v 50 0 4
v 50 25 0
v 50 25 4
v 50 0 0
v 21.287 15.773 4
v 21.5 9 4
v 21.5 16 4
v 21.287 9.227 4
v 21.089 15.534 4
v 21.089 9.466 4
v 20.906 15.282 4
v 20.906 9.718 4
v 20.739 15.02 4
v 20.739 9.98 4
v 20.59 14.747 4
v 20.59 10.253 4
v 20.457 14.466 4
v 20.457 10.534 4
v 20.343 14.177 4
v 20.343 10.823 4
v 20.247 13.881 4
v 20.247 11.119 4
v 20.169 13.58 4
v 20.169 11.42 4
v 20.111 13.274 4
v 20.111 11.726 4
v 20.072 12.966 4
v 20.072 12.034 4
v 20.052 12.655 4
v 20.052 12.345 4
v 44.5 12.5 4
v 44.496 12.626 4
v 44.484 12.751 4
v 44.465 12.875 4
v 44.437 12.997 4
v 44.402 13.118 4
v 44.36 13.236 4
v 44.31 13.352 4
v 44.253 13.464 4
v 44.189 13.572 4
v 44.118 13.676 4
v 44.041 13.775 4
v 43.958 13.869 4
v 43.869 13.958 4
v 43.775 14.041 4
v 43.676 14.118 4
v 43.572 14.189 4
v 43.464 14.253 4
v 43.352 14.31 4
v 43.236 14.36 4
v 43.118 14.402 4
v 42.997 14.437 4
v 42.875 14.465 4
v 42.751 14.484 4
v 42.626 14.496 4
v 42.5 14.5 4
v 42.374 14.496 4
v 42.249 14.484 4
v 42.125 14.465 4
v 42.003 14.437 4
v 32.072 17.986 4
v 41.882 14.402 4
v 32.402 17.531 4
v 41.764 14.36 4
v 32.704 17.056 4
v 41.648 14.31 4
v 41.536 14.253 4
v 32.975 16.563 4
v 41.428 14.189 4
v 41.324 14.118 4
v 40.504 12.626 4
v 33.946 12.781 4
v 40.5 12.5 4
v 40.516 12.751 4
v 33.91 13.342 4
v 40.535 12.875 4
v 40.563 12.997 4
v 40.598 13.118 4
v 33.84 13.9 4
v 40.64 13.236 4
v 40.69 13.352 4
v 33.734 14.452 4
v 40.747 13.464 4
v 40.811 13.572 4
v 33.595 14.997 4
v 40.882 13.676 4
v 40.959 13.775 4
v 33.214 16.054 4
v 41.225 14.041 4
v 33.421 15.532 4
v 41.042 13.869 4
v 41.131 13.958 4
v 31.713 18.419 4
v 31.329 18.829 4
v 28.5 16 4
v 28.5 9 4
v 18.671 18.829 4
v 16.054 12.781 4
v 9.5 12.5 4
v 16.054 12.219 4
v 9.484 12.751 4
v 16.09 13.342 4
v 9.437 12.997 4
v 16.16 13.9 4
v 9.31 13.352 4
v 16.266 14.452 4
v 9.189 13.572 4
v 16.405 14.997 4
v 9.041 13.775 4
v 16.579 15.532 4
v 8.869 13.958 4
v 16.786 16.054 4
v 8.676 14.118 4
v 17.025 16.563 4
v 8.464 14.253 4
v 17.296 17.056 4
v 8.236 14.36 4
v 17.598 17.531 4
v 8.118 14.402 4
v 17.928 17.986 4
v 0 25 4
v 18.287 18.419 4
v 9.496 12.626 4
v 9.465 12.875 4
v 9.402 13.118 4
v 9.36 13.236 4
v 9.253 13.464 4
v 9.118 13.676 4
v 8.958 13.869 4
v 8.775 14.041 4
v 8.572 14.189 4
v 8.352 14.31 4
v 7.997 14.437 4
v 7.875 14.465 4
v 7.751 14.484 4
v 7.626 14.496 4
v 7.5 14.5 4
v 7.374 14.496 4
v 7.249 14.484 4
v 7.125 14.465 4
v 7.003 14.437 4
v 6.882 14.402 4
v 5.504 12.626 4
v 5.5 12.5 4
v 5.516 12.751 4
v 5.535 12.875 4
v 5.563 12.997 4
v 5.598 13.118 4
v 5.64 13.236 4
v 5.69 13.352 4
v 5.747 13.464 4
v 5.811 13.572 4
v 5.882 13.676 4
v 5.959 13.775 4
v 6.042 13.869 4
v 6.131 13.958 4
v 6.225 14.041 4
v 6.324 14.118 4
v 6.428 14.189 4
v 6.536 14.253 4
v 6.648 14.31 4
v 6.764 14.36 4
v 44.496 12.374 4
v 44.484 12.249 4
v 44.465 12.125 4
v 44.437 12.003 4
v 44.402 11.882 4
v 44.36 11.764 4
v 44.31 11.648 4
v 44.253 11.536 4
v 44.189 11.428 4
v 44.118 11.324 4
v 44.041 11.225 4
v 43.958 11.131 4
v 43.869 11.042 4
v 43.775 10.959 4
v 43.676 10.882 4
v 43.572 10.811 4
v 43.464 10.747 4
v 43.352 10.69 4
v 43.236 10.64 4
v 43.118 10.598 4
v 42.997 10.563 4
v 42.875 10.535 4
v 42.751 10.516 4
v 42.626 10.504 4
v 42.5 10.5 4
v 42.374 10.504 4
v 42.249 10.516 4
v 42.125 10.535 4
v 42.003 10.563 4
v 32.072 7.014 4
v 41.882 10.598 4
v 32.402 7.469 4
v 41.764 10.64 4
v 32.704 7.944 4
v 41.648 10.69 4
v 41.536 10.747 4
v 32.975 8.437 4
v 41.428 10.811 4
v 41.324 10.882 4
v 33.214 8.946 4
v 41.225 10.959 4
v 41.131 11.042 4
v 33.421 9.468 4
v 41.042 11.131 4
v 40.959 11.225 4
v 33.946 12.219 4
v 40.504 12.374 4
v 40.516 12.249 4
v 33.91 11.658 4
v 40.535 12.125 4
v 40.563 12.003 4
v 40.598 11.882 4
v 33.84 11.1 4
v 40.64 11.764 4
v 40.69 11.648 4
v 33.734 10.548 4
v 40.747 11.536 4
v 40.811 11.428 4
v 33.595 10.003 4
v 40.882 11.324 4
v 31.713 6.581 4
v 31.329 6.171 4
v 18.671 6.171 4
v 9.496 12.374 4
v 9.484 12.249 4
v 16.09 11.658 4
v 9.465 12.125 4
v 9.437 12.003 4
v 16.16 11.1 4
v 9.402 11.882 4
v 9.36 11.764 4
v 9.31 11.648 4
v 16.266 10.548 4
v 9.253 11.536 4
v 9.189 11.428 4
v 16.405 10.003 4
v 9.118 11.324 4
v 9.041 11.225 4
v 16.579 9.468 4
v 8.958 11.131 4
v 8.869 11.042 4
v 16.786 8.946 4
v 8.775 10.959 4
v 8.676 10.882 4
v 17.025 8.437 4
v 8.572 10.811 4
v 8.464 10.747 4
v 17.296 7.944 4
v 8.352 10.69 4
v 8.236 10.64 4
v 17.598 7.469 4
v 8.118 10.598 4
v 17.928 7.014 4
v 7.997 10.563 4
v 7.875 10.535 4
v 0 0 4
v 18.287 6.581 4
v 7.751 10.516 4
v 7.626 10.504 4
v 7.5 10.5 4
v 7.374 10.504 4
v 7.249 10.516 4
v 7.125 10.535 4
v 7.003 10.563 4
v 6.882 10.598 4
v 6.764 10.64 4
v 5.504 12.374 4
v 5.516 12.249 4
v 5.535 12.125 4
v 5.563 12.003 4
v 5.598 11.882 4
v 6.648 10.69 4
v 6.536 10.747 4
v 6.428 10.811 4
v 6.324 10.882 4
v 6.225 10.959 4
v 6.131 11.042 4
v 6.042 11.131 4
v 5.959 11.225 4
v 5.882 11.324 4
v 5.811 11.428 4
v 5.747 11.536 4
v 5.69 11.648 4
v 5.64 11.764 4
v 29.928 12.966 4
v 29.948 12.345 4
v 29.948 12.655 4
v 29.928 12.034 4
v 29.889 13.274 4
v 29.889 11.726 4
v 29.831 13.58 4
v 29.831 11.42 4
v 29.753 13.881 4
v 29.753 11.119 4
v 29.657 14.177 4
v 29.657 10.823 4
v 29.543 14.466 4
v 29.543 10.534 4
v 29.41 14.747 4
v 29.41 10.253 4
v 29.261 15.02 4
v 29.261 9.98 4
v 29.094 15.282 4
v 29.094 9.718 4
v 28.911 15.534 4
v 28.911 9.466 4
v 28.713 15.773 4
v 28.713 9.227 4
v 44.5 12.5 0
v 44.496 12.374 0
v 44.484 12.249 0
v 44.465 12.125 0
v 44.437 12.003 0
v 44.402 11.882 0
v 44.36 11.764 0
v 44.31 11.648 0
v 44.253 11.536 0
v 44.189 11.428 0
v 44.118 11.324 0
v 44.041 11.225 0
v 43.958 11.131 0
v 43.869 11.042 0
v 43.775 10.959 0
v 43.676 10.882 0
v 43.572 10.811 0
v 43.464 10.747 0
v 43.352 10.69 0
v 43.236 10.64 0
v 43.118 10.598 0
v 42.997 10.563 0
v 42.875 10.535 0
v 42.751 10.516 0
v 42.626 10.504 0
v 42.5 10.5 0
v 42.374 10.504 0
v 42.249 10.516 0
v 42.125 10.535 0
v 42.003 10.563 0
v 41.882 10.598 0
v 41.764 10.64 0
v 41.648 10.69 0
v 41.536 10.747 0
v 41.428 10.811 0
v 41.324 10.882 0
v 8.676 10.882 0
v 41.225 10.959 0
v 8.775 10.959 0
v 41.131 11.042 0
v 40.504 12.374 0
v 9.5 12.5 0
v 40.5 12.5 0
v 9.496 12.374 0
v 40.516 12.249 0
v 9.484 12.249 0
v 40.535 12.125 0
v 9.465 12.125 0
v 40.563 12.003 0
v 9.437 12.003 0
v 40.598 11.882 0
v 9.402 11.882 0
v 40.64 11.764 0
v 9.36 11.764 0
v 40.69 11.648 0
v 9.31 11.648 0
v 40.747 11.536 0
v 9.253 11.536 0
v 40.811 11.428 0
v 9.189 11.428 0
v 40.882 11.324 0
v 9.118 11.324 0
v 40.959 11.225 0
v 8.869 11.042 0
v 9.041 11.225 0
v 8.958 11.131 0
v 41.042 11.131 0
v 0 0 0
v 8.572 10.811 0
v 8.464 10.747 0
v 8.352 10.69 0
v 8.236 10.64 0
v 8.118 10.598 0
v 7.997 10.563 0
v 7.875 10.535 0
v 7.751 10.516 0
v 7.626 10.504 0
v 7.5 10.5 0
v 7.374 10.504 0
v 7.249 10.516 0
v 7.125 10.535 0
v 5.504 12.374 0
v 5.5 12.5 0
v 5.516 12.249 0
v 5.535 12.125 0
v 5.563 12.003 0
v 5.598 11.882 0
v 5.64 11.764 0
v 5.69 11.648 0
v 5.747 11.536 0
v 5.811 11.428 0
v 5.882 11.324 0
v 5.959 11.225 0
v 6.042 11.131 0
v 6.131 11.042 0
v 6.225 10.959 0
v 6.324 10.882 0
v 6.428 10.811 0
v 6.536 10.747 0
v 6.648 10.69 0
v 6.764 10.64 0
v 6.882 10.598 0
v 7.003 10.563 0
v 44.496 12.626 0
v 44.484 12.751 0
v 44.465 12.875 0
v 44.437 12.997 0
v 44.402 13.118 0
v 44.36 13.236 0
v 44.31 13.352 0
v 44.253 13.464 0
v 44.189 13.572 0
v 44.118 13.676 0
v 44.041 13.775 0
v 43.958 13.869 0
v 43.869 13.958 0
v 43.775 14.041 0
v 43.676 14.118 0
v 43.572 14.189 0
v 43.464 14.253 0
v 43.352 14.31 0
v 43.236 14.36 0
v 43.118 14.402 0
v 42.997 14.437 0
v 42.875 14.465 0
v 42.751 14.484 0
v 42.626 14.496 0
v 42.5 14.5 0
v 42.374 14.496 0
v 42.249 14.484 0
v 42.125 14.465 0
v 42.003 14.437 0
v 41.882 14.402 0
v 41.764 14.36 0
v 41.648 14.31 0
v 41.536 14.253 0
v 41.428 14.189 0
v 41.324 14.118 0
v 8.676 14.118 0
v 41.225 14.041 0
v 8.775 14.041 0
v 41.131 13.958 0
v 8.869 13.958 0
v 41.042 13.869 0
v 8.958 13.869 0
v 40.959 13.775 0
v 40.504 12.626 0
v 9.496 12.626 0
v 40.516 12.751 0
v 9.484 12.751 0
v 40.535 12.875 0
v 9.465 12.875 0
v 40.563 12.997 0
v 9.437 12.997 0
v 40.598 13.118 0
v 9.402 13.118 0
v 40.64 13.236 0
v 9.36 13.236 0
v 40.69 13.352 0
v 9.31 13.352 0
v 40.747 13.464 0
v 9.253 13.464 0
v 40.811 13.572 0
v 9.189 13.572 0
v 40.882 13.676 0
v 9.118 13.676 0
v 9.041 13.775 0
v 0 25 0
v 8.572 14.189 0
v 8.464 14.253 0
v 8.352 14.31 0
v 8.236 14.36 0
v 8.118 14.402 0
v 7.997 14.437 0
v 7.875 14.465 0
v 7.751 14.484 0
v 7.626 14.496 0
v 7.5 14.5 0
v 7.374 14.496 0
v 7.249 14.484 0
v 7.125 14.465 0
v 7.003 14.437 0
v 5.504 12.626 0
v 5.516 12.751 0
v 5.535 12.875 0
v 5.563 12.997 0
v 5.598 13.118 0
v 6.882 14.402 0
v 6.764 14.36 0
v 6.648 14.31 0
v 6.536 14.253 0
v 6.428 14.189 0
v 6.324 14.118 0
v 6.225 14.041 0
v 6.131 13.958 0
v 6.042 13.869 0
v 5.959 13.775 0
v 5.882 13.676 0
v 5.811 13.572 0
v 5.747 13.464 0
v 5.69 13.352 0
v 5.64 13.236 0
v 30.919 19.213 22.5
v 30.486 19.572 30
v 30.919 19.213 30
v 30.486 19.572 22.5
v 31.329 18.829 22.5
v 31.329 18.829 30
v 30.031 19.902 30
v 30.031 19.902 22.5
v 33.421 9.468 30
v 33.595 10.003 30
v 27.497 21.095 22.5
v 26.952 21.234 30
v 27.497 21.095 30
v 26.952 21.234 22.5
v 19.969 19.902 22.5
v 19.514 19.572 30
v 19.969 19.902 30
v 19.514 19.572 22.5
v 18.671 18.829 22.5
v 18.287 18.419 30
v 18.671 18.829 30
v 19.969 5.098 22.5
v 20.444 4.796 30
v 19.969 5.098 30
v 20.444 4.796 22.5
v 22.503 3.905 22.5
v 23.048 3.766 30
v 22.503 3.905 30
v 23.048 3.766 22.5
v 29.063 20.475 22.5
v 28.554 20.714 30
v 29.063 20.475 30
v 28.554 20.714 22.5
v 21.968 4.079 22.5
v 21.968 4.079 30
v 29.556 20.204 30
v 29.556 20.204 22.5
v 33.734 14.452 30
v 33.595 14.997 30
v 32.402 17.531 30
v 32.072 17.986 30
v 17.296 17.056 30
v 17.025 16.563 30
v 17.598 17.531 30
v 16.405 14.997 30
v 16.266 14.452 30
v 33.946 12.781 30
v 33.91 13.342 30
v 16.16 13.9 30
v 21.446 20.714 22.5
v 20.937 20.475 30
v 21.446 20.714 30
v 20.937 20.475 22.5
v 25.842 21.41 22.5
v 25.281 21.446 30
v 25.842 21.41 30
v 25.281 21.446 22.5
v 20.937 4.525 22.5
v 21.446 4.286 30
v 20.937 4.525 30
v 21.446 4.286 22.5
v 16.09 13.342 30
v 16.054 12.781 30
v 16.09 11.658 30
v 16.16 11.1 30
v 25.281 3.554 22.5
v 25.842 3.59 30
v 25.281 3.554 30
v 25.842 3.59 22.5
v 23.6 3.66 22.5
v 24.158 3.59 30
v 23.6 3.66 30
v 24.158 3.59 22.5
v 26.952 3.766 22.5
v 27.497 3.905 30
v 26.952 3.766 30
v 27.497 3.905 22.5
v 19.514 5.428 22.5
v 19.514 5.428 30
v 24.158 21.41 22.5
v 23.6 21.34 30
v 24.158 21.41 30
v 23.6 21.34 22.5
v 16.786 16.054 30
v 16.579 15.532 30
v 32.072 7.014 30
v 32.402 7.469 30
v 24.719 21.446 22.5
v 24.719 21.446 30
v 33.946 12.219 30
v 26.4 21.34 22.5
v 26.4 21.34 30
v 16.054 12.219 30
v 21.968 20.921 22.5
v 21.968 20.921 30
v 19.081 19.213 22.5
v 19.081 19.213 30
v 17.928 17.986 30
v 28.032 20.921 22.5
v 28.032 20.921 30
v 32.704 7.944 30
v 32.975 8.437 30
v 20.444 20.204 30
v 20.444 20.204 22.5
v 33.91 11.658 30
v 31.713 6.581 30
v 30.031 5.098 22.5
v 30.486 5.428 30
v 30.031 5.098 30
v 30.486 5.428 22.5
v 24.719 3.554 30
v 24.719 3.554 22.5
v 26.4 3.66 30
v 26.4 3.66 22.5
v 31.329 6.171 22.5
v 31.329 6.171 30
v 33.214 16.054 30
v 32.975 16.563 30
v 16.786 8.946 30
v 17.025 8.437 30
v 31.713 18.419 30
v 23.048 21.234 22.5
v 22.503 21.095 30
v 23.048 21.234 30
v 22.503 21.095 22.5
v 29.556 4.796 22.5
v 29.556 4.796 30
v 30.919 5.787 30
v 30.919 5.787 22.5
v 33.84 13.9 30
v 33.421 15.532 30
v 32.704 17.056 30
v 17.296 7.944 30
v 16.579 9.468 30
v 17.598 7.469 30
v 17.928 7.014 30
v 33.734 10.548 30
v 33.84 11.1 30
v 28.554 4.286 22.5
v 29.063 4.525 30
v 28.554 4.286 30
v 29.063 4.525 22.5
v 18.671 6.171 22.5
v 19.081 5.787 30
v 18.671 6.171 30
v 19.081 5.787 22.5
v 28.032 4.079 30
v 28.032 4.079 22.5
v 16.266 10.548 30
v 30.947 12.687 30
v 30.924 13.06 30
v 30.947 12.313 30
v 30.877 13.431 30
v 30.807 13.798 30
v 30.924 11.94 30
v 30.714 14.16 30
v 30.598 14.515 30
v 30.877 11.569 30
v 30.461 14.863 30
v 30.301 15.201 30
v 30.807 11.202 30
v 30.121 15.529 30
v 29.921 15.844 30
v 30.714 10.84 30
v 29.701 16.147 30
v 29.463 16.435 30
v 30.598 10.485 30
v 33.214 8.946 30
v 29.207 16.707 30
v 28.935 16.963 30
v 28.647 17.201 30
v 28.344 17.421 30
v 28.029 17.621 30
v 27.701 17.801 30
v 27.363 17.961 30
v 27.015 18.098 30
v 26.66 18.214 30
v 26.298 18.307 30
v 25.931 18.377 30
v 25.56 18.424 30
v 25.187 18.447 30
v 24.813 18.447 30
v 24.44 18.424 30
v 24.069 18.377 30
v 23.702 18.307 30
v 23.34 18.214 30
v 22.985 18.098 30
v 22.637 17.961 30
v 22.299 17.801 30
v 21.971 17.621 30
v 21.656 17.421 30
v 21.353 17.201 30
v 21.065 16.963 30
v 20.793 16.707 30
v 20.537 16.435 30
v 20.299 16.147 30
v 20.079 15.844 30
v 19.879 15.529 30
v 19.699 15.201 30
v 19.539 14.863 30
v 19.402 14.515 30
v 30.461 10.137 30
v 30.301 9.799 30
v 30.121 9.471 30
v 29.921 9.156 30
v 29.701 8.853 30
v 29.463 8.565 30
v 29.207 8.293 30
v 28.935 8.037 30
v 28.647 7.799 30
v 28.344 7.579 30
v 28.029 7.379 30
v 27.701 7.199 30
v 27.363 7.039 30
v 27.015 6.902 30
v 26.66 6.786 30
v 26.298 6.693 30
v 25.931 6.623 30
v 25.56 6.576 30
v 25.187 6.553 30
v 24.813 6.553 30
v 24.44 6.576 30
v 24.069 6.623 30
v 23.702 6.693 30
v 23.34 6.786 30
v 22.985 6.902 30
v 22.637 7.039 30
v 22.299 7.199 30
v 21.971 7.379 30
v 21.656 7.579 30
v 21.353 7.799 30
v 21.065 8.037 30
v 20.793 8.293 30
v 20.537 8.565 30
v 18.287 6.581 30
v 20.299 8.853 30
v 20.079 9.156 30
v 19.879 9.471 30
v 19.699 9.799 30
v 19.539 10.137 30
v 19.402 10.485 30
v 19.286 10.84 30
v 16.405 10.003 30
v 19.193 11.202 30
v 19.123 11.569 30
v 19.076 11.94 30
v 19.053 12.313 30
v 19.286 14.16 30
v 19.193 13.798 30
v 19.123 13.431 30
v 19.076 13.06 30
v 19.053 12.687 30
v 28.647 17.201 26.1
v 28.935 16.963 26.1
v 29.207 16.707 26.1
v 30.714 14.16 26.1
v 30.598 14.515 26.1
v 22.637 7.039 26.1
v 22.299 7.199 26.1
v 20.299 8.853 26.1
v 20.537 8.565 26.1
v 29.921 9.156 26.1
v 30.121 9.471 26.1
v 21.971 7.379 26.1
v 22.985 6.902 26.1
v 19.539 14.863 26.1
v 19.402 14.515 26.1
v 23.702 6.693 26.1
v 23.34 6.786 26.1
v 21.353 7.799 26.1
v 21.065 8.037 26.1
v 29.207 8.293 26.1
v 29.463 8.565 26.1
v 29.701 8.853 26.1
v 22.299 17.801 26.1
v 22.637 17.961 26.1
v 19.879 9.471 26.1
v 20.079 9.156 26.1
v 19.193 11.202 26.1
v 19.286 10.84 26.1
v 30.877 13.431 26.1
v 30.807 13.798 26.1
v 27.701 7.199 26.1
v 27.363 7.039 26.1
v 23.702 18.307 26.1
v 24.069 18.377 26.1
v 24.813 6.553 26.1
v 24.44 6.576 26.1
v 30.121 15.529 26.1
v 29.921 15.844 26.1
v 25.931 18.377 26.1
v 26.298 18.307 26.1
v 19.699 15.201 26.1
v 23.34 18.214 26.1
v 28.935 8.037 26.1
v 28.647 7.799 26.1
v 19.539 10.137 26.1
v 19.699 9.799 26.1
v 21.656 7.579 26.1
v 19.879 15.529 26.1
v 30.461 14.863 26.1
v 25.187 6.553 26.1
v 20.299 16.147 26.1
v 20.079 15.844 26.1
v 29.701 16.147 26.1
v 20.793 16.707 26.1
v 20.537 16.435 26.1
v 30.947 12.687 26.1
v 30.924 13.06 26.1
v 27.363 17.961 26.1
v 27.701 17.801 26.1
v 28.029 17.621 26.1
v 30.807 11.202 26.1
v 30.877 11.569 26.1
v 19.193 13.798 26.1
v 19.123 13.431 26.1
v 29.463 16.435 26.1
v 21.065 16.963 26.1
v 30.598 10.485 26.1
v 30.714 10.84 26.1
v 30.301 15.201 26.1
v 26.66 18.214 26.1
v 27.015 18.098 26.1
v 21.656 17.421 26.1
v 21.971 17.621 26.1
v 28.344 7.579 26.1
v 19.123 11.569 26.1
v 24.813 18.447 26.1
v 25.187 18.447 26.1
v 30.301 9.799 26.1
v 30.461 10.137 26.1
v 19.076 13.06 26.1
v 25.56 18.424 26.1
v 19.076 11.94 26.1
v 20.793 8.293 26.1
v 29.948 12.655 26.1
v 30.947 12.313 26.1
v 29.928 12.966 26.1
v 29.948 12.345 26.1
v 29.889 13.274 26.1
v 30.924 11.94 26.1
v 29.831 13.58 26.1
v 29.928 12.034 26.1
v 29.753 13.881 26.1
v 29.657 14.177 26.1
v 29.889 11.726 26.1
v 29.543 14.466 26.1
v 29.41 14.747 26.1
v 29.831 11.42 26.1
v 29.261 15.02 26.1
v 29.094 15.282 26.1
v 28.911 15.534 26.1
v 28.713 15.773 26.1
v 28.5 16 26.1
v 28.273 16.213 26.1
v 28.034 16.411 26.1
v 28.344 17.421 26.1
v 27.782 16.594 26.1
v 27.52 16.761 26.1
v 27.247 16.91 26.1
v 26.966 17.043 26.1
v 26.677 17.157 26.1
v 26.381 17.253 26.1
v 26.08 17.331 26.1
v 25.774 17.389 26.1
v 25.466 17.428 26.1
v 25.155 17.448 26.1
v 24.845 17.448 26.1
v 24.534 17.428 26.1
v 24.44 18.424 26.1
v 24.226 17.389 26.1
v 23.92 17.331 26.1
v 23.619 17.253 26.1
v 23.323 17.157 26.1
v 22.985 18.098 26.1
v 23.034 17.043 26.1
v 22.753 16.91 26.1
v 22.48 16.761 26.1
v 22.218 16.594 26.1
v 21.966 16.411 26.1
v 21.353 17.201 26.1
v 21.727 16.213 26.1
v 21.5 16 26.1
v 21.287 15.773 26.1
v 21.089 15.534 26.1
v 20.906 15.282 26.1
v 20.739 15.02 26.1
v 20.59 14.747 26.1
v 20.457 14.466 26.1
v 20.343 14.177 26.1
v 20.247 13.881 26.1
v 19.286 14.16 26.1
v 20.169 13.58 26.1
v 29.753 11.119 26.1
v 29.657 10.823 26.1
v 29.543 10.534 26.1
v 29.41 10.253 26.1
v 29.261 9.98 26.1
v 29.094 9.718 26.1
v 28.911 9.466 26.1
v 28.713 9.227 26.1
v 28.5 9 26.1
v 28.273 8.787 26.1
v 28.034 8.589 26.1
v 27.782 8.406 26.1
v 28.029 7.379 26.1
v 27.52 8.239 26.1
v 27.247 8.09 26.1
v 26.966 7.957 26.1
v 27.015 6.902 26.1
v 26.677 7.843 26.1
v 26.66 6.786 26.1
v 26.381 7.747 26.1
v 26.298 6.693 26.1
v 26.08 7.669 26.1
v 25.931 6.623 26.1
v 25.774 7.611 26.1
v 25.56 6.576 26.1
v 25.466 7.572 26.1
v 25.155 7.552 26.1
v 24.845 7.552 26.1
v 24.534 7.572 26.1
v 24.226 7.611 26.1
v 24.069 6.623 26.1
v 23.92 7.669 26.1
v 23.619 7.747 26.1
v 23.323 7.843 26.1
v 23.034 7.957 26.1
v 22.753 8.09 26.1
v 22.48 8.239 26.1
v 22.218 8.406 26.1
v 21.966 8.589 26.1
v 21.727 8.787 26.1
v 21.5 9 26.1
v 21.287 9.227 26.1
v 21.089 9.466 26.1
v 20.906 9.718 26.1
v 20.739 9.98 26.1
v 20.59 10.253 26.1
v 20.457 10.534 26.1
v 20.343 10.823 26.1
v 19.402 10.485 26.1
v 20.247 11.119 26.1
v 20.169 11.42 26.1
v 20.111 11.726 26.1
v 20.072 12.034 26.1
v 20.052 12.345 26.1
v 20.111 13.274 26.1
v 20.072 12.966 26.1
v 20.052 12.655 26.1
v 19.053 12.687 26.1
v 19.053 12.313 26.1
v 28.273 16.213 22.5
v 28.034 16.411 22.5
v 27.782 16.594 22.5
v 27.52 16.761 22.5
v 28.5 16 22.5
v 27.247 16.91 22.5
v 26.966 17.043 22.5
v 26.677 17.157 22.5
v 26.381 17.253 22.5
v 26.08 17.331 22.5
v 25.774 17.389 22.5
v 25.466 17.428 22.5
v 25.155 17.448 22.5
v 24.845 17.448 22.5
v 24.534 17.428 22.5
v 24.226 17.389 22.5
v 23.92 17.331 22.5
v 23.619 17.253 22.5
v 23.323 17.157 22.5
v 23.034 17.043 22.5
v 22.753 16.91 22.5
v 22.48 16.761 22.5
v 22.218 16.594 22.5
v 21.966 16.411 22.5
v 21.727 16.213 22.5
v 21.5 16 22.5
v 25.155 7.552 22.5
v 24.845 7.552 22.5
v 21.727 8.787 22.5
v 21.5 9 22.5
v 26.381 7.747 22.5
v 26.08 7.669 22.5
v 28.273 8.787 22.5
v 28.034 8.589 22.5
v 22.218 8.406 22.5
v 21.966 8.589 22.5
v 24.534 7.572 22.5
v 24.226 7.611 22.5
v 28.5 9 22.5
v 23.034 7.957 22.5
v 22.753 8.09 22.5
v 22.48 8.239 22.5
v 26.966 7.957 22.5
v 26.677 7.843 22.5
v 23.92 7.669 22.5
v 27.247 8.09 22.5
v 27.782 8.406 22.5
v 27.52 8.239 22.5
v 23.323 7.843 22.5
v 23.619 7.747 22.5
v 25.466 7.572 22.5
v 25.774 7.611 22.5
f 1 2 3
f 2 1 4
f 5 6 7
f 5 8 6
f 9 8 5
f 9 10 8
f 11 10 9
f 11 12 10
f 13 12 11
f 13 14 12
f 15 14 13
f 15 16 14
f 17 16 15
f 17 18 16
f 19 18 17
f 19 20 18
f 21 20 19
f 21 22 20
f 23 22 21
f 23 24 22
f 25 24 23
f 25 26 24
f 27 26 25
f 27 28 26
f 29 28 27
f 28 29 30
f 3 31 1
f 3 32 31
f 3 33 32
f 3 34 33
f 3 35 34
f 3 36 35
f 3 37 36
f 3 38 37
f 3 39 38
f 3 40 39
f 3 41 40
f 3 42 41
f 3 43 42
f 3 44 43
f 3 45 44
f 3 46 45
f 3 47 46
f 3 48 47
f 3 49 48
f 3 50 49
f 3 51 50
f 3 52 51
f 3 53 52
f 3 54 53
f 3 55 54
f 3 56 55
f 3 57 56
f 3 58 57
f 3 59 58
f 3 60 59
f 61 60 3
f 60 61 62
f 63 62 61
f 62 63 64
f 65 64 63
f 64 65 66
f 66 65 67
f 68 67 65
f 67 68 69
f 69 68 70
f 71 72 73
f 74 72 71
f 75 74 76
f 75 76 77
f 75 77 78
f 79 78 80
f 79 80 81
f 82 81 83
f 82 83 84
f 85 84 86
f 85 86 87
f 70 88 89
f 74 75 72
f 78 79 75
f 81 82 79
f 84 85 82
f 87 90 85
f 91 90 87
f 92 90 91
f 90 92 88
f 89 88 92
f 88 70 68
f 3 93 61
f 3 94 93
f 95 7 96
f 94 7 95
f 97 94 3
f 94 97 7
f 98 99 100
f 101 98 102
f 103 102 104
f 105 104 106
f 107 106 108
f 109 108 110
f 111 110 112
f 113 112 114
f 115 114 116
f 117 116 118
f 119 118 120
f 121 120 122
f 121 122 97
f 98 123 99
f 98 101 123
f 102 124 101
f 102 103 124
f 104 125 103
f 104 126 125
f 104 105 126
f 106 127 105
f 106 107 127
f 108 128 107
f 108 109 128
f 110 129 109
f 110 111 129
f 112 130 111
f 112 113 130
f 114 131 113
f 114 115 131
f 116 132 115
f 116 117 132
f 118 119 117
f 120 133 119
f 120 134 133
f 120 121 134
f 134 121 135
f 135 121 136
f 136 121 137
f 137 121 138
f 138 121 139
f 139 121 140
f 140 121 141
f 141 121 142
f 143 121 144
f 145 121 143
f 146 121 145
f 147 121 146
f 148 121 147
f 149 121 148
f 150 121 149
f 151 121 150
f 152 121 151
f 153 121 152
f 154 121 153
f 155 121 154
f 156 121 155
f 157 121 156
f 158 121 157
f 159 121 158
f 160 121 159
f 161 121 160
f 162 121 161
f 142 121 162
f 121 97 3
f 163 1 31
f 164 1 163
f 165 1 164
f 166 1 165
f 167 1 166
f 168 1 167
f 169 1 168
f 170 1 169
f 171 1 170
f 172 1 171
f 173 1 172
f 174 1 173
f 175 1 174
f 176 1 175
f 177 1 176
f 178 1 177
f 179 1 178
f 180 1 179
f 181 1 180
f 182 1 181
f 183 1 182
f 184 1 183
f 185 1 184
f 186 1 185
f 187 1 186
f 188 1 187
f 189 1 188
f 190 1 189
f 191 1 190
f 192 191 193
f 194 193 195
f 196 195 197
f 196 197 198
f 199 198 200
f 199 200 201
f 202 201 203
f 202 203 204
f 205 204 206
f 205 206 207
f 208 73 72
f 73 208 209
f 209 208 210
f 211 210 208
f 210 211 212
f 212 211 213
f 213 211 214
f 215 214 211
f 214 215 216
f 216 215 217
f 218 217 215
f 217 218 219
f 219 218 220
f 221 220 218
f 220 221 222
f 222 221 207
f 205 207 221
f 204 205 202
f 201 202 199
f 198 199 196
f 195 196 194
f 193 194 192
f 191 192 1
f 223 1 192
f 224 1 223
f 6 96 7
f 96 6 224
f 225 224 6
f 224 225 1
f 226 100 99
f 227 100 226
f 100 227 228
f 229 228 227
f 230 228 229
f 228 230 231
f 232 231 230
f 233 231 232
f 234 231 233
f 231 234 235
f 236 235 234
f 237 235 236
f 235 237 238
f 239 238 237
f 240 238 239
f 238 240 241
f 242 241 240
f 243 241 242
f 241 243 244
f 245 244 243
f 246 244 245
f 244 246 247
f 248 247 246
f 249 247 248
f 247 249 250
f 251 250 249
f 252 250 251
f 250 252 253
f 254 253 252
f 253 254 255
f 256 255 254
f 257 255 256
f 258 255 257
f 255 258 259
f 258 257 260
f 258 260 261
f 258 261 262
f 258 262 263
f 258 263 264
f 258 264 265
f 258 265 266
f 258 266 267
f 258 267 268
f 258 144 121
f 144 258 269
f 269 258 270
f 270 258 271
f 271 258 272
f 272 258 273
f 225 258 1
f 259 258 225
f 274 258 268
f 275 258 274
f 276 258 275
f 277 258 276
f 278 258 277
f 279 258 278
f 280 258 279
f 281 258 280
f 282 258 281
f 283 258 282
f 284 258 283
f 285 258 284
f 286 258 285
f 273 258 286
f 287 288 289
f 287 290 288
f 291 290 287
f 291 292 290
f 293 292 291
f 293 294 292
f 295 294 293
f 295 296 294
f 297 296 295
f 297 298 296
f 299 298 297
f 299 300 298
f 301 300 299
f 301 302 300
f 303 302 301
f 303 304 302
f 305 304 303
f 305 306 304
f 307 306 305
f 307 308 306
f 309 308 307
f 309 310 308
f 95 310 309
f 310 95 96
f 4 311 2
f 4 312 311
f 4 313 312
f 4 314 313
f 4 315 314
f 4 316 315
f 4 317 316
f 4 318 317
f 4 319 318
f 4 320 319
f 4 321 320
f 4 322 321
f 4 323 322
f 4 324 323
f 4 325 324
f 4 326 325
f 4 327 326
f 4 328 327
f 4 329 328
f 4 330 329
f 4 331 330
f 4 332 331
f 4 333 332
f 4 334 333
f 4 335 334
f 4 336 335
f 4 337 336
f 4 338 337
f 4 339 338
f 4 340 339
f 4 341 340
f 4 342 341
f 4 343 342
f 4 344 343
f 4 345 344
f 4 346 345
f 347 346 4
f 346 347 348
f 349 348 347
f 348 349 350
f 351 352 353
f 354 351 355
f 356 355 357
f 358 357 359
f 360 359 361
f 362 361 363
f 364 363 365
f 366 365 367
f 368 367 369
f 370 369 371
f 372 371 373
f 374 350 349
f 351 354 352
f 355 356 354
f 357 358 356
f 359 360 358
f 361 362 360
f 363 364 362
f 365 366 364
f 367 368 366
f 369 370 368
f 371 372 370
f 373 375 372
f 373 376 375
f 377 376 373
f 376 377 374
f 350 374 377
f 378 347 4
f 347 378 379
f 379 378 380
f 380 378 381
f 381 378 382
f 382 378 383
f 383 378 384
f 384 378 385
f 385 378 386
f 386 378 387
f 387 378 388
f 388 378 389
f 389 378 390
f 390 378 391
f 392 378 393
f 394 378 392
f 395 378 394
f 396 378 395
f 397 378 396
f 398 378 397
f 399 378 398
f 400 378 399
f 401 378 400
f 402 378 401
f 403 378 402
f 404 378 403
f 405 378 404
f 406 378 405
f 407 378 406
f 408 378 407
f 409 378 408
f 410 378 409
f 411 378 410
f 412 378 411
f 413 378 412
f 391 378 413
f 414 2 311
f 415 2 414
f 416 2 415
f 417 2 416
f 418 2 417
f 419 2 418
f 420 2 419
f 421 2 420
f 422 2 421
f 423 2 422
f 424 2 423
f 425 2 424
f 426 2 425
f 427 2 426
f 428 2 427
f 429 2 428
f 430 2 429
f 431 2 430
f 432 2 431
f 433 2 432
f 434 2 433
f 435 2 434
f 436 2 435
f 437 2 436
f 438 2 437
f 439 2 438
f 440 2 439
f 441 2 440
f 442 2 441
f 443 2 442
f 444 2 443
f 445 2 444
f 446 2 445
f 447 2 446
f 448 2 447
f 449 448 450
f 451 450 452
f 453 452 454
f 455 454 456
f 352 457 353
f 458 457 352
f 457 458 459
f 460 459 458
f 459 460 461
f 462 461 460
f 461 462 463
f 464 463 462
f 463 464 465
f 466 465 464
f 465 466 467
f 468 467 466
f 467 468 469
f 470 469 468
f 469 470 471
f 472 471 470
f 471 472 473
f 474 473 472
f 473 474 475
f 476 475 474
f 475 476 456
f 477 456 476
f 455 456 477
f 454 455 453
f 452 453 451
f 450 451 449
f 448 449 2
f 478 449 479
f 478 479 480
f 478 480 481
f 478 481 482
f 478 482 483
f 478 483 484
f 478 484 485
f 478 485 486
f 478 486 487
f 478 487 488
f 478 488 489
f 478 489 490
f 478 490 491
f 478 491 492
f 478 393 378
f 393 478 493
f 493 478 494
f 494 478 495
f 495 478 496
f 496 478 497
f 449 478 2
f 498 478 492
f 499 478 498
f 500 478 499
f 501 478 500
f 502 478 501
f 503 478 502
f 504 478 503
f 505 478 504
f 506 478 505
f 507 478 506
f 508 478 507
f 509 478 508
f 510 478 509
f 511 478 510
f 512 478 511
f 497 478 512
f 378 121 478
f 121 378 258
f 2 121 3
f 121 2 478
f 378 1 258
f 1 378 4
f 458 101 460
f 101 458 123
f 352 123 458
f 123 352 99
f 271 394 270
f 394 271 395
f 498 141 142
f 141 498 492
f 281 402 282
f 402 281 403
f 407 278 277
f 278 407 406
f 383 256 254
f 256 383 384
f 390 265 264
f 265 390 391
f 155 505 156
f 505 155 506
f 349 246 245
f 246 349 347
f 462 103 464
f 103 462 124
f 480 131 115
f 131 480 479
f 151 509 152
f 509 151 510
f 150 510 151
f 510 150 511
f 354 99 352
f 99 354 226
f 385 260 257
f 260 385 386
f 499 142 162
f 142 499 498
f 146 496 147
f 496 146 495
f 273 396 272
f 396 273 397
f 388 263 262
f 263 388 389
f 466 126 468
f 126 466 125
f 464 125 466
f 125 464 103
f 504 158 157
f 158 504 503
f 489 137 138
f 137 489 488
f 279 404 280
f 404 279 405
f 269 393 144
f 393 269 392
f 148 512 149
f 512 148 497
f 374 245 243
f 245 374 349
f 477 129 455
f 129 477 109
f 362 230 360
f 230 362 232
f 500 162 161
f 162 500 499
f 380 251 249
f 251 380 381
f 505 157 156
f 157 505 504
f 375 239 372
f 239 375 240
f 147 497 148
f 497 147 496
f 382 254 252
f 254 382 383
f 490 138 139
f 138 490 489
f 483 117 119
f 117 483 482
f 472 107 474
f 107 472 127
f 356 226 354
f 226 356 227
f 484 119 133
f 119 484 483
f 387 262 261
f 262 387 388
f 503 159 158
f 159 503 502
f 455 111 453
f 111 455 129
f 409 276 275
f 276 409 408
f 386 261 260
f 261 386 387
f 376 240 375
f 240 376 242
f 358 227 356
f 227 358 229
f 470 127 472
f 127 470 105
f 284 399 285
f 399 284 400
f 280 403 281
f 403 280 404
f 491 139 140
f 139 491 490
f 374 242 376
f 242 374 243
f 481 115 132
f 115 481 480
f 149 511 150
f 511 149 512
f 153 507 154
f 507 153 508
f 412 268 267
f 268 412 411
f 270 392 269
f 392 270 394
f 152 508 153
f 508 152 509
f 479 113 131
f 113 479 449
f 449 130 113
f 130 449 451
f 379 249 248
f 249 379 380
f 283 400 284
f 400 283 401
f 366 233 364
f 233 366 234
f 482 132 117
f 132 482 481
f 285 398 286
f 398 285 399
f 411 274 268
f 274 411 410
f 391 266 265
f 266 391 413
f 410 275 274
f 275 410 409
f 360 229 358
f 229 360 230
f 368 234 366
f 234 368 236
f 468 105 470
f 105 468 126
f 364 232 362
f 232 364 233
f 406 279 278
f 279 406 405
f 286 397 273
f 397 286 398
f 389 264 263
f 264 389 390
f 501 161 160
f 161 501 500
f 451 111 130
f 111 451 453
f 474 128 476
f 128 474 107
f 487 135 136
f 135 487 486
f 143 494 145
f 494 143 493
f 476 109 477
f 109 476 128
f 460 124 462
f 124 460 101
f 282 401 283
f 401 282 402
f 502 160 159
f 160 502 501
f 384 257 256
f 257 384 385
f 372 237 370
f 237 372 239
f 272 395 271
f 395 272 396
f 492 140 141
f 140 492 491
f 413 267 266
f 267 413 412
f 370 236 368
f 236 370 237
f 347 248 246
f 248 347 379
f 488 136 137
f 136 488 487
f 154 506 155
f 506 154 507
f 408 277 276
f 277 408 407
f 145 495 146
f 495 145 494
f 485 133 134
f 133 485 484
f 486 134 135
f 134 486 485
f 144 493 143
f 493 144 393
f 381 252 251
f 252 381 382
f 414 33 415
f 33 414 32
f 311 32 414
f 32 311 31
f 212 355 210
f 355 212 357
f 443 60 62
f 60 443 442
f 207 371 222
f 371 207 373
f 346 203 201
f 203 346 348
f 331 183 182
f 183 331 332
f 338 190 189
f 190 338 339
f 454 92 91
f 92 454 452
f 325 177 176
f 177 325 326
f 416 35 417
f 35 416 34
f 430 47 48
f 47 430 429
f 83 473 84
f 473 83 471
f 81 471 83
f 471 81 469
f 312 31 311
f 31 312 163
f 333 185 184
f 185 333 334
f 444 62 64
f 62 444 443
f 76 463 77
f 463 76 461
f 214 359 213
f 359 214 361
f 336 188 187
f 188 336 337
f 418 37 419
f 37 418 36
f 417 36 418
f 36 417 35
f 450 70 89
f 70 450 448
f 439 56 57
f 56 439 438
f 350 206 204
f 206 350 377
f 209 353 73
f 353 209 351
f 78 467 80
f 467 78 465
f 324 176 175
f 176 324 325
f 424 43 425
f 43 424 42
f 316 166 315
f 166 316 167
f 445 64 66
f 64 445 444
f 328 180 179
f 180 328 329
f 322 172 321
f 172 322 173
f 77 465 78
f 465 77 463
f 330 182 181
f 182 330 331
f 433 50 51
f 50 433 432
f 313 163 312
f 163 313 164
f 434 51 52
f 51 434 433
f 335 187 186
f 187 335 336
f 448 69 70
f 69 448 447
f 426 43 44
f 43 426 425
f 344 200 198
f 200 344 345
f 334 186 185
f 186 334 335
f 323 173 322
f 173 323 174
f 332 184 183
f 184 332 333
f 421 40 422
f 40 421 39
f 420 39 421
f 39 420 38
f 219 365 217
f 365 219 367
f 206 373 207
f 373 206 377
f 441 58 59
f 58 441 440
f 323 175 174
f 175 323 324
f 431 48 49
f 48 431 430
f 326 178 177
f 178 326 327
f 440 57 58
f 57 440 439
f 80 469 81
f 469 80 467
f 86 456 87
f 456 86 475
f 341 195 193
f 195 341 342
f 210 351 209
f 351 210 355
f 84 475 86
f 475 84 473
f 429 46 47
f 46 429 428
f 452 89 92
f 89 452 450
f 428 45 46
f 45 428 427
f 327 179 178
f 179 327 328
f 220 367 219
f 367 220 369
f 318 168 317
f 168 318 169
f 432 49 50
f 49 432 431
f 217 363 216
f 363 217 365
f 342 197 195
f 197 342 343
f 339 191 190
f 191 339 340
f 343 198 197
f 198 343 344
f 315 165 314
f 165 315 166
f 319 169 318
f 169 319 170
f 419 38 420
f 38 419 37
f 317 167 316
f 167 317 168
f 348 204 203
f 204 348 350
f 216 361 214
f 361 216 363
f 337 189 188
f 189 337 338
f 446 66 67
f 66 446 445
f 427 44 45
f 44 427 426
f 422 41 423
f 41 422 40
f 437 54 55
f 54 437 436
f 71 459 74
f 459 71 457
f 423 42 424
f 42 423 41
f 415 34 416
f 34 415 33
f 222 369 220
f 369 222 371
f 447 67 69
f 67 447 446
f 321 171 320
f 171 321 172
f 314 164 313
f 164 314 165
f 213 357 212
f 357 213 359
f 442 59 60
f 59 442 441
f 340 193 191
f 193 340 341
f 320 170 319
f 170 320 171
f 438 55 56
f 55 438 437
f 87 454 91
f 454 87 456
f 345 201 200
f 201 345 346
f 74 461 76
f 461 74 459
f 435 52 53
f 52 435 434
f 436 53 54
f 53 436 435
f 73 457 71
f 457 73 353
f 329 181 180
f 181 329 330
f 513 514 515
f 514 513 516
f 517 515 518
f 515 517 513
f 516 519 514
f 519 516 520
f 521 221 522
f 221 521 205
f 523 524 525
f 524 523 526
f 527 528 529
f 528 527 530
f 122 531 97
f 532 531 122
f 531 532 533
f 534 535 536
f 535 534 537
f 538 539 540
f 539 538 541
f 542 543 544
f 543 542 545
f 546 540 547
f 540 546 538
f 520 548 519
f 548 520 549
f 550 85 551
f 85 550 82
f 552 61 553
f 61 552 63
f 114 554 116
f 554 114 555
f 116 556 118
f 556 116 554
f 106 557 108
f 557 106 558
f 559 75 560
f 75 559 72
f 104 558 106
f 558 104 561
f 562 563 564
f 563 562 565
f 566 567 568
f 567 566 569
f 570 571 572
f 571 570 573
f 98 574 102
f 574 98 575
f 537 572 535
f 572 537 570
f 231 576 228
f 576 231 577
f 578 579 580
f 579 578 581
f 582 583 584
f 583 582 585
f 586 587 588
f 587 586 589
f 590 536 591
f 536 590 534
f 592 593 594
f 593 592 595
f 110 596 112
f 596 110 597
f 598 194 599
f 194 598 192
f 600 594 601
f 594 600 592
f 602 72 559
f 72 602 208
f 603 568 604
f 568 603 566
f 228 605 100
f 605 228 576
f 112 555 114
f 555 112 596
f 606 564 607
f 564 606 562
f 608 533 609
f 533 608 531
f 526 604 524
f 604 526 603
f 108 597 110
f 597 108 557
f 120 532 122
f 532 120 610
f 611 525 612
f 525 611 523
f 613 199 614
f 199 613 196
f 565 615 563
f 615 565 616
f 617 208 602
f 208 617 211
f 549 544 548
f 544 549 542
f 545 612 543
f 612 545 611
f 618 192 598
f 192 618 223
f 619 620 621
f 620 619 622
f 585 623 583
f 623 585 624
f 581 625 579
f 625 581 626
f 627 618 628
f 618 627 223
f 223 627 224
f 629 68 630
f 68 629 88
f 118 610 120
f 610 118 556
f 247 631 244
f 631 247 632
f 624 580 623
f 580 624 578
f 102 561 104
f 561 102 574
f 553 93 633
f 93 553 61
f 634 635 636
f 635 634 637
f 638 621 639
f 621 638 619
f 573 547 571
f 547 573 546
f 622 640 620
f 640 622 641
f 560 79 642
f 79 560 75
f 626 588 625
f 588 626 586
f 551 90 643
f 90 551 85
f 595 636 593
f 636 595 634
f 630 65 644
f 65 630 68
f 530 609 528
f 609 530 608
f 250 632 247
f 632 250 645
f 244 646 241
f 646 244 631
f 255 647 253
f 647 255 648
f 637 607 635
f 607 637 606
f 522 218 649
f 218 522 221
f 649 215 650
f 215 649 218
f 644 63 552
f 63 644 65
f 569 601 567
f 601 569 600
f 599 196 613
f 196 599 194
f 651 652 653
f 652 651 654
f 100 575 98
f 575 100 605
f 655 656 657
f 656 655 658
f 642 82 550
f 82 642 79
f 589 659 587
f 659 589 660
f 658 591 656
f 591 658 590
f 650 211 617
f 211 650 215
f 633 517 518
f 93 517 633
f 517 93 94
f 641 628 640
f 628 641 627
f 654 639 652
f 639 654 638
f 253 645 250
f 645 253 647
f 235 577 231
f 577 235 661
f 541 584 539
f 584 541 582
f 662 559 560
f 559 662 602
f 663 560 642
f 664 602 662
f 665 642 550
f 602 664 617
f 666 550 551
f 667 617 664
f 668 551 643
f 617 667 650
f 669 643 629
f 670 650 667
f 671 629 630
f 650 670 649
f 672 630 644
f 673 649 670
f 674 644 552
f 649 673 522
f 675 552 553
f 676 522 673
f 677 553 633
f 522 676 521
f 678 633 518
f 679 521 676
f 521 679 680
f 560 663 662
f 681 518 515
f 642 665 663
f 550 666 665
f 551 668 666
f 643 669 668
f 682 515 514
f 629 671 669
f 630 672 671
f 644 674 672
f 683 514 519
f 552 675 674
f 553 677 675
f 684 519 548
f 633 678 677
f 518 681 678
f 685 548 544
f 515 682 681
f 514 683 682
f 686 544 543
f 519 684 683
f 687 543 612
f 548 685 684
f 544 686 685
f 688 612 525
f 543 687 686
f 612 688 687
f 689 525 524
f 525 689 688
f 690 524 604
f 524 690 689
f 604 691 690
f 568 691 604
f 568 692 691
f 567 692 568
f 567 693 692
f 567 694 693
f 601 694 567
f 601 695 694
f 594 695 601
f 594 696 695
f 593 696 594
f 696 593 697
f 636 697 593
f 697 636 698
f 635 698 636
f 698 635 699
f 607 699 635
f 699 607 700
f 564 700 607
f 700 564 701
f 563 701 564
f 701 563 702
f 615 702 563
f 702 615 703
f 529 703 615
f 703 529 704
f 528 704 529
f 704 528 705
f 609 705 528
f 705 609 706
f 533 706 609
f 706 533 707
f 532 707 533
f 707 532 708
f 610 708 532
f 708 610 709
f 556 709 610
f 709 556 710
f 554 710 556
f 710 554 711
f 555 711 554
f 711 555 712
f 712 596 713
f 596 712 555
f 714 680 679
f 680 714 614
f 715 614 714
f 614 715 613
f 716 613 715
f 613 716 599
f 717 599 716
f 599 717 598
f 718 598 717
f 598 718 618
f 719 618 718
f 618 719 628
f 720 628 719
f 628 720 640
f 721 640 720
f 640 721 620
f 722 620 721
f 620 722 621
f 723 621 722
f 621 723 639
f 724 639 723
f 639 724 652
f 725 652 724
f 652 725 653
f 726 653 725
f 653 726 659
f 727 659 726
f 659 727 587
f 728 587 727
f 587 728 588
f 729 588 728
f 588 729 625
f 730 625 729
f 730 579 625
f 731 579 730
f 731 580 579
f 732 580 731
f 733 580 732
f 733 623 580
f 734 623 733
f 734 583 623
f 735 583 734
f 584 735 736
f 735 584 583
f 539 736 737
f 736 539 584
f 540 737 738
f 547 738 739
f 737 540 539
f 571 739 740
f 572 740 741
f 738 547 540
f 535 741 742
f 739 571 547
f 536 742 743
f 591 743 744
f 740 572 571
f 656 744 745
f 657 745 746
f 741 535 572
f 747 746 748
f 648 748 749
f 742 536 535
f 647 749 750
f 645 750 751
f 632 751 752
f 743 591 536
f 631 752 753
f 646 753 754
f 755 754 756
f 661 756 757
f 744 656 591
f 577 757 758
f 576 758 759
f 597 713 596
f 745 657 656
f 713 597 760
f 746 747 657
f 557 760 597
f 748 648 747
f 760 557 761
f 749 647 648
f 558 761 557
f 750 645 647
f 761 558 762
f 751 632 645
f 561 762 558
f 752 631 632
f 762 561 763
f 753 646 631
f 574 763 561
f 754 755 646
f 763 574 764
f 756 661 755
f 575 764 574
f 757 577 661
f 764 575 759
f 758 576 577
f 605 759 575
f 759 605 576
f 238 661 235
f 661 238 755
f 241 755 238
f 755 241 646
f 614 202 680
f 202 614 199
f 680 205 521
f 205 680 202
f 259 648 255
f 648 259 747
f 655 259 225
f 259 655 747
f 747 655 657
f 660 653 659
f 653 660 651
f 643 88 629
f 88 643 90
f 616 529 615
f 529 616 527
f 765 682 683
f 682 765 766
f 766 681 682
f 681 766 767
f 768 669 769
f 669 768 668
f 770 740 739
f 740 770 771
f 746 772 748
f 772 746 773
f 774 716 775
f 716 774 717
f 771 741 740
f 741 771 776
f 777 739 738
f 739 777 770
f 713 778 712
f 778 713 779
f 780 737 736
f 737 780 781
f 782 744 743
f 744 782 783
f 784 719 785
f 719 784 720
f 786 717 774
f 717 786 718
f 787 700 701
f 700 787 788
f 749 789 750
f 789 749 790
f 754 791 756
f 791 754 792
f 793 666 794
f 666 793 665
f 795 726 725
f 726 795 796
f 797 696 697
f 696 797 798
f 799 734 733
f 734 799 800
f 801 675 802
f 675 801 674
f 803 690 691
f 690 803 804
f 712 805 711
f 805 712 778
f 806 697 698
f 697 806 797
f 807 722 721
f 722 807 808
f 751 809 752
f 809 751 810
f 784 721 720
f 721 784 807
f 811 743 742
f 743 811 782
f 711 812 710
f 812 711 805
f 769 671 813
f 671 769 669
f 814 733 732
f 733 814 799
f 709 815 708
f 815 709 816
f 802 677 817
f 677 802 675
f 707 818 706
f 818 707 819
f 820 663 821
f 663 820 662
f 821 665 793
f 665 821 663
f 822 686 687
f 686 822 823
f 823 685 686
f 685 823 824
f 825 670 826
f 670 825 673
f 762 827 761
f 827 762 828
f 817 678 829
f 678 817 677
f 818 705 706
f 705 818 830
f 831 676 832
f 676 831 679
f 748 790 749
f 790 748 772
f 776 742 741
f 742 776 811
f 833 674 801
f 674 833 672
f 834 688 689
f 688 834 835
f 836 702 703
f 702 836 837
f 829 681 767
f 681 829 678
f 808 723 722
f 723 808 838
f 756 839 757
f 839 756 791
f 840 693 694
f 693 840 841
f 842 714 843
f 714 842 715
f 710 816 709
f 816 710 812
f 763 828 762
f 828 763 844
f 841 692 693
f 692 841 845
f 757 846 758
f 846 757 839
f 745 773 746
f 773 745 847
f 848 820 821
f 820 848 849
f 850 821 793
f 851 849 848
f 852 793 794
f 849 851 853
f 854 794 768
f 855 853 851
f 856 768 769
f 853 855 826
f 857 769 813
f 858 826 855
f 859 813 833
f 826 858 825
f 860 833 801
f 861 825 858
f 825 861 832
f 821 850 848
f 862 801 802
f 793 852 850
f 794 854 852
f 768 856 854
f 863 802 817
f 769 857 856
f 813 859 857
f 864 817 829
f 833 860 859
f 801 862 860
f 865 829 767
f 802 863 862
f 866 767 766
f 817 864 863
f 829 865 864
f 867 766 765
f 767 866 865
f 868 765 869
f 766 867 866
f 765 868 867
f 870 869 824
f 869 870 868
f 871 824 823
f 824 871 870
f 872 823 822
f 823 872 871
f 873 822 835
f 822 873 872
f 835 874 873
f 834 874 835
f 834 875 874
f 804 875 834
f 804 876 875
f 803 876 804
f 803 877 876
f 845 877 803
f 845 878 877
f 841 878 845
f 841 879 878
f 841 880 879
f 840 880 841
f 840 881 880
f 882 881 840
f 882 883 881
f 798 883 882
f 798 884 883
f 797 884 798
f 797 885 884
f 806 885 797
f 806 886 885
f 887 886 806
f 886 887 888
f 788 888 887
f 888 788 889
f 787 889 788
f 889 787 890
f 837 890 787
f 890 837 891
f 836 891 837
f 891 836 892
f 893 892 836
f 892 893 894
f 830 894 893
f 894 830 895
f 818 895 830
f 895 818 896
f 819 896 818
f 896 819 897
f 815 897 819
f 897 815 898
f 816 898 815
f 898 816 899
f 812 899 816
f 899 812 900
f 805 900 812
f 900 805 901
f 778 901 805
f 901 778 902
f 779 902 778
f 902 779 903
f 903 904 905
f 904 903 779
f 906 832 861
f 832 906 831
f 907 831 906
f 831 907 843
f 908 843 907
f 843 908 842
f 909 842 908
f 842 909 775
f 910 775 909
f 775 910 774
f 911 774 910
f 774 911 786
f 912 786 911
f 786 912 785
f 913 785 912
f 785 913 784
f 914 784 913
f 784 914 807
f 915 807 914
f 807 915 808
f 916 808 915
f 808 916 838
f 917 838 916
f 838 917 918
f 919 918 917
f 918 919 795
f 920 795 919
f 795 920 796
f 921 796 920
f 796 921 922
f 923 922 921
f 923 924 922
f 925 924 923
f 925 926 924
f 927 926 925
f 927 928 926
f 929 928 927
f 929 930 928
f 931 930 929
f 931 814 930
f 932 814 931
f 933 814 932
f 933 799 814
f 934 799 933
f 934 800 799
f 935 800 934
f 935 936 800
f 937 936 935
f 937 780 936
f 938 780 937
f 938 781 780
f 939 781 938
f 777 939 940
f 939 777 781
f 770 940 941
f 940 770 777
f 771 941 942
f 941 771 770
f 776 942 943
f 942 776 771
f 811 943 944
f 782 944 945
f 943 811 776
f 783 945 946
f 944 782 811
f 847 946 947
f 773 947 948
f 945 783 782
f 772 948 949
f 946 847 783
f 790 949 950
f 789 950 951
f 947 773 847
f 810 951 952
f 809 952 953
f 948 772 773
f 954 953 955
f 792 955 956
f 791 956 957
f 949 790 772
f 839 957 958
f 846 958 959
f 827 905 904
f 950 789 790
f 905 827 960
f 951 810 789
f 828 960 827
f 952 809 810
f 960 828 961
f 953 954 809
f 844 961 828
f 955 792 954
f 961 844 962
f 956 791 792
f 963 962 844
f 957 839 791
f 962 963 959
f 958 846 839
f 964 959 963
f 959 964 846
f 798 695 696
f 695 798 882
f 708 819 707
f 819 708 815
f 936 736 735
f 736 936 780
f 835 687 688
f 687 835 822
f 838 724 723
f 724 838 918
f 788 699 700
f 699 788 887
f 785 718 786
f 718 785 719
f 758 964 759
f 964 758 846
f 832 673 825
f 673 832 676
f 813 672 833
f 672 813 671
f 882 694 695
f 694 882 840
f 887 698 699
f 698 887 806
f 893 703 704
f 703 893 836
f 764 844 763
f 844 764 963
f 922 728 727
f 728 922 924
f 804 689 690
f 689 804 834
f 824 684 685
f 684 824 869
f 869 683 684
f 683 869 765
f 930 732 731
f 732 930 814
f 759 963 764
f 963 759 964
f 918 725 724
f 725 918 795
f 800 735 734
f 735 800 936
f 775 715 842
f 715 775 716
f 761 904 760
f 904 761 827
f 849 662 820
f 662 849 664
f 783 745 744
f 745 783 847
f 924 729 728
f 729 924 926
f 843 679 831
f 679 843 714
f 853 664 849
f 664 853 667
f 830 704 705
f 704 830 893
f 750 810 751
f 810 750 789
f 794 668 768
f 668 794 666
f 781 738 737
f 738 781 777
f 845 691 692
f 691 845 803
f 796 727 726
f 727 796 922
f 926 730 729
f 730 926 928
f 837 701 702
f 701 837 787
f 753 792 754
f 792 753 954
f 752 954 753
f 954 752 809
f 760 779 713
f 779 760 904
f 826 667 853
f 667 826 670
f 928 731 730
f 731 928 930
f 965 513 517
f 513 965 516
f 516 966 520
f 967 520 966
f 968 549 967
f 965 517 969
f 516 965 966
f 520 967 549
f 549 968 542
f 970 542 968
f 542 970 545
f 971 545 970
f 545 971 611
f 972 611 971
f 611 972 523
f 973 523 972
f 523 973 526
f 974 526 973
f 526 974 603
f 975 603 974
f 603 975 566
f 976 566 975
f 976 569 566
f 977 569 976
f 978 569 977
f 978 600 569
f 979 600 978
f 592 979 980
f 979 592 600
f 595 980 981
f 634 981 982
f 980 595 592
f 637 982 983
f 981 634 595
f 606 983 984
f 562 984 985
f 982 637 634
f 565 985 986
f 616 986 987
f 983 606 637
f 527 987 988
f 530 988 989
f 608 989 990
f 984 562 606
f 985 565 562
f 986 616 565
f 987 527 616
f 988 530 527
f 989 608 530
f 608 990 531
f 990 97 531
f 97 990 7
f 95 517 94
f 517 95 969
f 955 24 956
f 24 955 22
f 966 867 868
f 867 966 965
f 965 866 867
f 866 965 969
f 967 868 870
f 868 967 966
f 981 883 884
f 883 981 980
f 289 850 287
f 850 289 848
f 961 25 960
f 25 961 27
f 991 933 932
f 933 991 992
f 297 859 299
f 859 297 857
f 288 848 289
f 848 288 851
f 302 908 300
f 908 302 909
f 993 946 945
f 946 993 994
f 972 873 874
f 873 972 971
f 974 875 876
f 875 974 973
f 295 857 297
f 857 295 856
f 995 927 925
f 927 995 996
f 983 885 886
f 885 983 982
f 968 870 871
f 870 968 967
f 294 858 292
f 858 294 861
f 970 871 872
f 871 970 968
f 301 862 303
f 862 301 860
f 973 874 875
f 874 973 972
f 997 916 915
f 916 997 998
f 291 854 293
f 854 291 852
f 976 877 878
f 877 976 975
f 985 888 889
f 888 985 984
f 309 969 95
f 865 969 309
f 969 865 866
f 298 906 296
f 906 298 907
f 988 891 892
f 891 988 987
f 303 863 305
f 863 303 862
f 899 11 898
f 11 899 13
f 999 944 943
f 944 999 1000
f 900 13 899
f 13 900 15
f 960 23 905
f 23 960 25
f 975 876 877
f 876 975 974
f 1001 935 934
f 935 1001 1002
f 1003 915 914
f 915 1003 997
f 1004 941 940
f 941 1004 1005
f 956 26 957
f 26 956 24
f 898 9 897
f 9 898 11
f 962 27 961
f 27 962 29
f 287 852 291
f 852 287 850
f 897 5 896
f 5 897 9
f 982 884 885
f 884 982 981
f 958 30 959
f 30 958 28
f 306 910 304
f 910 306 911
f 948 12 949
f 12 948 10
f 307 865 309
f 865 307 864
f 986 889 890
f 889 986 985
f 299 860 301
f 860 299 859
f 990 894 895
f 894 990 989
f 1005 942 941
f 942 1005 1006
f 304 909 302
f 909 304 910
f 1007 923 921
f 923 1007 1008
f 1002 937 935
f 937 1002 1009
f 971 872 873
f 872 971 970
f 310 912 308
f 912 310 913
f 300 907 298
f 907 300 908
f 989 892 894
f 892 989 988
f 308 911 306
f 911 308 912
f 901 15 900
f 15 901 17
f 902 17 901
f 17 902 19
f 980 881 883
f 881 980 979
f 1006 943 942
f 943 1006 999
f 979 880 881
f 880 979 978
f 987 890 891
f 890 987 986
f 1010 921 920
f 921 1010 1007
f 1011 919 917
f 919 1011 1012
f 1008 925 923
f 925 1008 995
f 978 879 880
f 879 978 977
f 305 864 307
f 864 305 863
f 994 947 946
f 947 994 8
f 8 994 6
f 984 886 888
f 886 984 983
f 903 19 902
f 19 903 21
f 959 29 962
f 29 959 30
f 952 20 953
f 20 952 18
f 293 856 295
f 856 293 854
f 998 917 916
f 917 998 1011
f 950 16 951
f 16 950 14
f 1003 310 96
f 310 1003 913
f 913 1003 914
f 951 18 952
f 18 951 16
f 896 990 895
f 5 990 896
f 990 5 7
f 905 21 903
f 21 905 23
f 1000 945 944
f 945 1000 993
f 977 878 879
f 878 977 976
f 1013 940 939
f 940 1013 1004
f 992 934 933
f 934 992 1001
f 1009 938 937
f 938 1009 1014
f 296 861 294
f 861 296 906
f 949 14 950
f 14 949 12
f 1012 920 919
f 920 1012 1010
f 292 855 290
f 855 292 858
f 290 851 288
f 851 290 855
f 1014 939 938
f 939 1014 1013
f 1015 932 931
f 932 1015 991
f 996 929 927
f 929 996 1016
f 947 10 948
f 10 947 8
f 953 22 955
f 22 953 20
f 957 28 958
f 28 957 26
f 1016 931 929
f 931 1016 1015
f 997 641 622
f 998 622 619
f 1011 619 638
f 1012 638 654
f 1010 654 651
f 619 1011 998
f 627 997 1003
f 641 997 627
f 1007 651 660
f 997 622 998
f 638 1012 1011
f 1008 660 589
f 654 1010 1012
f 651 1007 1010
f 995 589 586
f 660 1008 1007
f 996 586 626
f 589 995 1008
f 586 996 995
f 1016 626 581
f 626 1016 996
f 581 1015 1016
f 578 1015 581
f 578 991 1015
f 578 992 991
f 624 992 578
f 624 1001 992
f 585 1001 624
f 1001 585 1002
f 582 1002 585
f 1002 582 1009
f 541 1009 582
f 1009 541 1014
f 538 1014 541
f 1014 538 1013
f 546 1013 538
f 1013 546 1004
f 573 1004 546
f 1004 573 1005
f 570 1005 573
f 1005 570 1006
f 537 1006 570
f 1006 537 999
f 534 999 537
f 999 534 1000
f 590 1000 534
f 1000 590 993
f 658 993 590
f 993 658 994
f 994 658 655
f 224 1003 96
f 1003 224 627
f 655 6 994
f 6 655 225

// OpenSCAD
// Parameters:
$fn = 100;
length = 50;
width = 25;
height = 4;

margin = 0.2; // 0.2 for 10mm // 0.4 // 0.6 => perfect for 14mm
 
module_radius = 5.75 + margin;
thickness = 3;
outer_radius = module_radius + thickness;

support_height = 30; // height of the support
 
screw_hole_radius = 2; // radius of the screw holes in mm
screw_spacing = 35; // this spacing is important, as it will determine the holes in the board
 
stop_size = 1;
 
// end of parameters

union(){
    difference(){
        cube([length, width, height]);
        translate([(length - screw_spacing) / 2, width / 2, -1]) cylinder(height + 2, screw_hole_radius, screw_hole_radius);
        translate([(length - screw_spacing) / 2 + screw_spacing, width / 2, -1]) cylinder(height + 2, screw_hole_radius, screw_hole_radius);
    }
    translate([length / 2, width / 2, 0]) cylindrical_stop_leg();
    //translate([length / 2, width / 2, 0]) cylindrical_leg();
}

module cylindrical_leg(){
    rotate([0, 0, 45])
    difference() {
        cylinder(support_height, outer_radius, outer_radius);
        translate([0, 0, -1]) cylinder(support_height + 2, module_radius, module_radius);
        cube([outer_radius, outer_radius, support_height * 0.75]);
        rotate([0, 0, 180]) cube([outer_radius, outer_radius, support_height * 0.75]);
    }
}

module cylindrical_stop_leg(){
    rotate([0, 0, 45])
    difference() {
        cylinder(support_height, outer_radius, outer_radius);
        translate([0, 0, support_height * 0.87]) cylinder(support_height + 2, module_radius, module_radius);
        cube([outer_radius, outer_radius, support_height * 0.75]);
        translate([0, 0, -1]) cylinder(support_height + 2, module_radius - stop_size, module_radius - stop_size);
        cube([outer_radius, outer_radius, support_height * 0.75]);
        rotate([0, 0, 180]) cube([outer_radius, outer_radius, support_height * 0.75]);
    }
}
